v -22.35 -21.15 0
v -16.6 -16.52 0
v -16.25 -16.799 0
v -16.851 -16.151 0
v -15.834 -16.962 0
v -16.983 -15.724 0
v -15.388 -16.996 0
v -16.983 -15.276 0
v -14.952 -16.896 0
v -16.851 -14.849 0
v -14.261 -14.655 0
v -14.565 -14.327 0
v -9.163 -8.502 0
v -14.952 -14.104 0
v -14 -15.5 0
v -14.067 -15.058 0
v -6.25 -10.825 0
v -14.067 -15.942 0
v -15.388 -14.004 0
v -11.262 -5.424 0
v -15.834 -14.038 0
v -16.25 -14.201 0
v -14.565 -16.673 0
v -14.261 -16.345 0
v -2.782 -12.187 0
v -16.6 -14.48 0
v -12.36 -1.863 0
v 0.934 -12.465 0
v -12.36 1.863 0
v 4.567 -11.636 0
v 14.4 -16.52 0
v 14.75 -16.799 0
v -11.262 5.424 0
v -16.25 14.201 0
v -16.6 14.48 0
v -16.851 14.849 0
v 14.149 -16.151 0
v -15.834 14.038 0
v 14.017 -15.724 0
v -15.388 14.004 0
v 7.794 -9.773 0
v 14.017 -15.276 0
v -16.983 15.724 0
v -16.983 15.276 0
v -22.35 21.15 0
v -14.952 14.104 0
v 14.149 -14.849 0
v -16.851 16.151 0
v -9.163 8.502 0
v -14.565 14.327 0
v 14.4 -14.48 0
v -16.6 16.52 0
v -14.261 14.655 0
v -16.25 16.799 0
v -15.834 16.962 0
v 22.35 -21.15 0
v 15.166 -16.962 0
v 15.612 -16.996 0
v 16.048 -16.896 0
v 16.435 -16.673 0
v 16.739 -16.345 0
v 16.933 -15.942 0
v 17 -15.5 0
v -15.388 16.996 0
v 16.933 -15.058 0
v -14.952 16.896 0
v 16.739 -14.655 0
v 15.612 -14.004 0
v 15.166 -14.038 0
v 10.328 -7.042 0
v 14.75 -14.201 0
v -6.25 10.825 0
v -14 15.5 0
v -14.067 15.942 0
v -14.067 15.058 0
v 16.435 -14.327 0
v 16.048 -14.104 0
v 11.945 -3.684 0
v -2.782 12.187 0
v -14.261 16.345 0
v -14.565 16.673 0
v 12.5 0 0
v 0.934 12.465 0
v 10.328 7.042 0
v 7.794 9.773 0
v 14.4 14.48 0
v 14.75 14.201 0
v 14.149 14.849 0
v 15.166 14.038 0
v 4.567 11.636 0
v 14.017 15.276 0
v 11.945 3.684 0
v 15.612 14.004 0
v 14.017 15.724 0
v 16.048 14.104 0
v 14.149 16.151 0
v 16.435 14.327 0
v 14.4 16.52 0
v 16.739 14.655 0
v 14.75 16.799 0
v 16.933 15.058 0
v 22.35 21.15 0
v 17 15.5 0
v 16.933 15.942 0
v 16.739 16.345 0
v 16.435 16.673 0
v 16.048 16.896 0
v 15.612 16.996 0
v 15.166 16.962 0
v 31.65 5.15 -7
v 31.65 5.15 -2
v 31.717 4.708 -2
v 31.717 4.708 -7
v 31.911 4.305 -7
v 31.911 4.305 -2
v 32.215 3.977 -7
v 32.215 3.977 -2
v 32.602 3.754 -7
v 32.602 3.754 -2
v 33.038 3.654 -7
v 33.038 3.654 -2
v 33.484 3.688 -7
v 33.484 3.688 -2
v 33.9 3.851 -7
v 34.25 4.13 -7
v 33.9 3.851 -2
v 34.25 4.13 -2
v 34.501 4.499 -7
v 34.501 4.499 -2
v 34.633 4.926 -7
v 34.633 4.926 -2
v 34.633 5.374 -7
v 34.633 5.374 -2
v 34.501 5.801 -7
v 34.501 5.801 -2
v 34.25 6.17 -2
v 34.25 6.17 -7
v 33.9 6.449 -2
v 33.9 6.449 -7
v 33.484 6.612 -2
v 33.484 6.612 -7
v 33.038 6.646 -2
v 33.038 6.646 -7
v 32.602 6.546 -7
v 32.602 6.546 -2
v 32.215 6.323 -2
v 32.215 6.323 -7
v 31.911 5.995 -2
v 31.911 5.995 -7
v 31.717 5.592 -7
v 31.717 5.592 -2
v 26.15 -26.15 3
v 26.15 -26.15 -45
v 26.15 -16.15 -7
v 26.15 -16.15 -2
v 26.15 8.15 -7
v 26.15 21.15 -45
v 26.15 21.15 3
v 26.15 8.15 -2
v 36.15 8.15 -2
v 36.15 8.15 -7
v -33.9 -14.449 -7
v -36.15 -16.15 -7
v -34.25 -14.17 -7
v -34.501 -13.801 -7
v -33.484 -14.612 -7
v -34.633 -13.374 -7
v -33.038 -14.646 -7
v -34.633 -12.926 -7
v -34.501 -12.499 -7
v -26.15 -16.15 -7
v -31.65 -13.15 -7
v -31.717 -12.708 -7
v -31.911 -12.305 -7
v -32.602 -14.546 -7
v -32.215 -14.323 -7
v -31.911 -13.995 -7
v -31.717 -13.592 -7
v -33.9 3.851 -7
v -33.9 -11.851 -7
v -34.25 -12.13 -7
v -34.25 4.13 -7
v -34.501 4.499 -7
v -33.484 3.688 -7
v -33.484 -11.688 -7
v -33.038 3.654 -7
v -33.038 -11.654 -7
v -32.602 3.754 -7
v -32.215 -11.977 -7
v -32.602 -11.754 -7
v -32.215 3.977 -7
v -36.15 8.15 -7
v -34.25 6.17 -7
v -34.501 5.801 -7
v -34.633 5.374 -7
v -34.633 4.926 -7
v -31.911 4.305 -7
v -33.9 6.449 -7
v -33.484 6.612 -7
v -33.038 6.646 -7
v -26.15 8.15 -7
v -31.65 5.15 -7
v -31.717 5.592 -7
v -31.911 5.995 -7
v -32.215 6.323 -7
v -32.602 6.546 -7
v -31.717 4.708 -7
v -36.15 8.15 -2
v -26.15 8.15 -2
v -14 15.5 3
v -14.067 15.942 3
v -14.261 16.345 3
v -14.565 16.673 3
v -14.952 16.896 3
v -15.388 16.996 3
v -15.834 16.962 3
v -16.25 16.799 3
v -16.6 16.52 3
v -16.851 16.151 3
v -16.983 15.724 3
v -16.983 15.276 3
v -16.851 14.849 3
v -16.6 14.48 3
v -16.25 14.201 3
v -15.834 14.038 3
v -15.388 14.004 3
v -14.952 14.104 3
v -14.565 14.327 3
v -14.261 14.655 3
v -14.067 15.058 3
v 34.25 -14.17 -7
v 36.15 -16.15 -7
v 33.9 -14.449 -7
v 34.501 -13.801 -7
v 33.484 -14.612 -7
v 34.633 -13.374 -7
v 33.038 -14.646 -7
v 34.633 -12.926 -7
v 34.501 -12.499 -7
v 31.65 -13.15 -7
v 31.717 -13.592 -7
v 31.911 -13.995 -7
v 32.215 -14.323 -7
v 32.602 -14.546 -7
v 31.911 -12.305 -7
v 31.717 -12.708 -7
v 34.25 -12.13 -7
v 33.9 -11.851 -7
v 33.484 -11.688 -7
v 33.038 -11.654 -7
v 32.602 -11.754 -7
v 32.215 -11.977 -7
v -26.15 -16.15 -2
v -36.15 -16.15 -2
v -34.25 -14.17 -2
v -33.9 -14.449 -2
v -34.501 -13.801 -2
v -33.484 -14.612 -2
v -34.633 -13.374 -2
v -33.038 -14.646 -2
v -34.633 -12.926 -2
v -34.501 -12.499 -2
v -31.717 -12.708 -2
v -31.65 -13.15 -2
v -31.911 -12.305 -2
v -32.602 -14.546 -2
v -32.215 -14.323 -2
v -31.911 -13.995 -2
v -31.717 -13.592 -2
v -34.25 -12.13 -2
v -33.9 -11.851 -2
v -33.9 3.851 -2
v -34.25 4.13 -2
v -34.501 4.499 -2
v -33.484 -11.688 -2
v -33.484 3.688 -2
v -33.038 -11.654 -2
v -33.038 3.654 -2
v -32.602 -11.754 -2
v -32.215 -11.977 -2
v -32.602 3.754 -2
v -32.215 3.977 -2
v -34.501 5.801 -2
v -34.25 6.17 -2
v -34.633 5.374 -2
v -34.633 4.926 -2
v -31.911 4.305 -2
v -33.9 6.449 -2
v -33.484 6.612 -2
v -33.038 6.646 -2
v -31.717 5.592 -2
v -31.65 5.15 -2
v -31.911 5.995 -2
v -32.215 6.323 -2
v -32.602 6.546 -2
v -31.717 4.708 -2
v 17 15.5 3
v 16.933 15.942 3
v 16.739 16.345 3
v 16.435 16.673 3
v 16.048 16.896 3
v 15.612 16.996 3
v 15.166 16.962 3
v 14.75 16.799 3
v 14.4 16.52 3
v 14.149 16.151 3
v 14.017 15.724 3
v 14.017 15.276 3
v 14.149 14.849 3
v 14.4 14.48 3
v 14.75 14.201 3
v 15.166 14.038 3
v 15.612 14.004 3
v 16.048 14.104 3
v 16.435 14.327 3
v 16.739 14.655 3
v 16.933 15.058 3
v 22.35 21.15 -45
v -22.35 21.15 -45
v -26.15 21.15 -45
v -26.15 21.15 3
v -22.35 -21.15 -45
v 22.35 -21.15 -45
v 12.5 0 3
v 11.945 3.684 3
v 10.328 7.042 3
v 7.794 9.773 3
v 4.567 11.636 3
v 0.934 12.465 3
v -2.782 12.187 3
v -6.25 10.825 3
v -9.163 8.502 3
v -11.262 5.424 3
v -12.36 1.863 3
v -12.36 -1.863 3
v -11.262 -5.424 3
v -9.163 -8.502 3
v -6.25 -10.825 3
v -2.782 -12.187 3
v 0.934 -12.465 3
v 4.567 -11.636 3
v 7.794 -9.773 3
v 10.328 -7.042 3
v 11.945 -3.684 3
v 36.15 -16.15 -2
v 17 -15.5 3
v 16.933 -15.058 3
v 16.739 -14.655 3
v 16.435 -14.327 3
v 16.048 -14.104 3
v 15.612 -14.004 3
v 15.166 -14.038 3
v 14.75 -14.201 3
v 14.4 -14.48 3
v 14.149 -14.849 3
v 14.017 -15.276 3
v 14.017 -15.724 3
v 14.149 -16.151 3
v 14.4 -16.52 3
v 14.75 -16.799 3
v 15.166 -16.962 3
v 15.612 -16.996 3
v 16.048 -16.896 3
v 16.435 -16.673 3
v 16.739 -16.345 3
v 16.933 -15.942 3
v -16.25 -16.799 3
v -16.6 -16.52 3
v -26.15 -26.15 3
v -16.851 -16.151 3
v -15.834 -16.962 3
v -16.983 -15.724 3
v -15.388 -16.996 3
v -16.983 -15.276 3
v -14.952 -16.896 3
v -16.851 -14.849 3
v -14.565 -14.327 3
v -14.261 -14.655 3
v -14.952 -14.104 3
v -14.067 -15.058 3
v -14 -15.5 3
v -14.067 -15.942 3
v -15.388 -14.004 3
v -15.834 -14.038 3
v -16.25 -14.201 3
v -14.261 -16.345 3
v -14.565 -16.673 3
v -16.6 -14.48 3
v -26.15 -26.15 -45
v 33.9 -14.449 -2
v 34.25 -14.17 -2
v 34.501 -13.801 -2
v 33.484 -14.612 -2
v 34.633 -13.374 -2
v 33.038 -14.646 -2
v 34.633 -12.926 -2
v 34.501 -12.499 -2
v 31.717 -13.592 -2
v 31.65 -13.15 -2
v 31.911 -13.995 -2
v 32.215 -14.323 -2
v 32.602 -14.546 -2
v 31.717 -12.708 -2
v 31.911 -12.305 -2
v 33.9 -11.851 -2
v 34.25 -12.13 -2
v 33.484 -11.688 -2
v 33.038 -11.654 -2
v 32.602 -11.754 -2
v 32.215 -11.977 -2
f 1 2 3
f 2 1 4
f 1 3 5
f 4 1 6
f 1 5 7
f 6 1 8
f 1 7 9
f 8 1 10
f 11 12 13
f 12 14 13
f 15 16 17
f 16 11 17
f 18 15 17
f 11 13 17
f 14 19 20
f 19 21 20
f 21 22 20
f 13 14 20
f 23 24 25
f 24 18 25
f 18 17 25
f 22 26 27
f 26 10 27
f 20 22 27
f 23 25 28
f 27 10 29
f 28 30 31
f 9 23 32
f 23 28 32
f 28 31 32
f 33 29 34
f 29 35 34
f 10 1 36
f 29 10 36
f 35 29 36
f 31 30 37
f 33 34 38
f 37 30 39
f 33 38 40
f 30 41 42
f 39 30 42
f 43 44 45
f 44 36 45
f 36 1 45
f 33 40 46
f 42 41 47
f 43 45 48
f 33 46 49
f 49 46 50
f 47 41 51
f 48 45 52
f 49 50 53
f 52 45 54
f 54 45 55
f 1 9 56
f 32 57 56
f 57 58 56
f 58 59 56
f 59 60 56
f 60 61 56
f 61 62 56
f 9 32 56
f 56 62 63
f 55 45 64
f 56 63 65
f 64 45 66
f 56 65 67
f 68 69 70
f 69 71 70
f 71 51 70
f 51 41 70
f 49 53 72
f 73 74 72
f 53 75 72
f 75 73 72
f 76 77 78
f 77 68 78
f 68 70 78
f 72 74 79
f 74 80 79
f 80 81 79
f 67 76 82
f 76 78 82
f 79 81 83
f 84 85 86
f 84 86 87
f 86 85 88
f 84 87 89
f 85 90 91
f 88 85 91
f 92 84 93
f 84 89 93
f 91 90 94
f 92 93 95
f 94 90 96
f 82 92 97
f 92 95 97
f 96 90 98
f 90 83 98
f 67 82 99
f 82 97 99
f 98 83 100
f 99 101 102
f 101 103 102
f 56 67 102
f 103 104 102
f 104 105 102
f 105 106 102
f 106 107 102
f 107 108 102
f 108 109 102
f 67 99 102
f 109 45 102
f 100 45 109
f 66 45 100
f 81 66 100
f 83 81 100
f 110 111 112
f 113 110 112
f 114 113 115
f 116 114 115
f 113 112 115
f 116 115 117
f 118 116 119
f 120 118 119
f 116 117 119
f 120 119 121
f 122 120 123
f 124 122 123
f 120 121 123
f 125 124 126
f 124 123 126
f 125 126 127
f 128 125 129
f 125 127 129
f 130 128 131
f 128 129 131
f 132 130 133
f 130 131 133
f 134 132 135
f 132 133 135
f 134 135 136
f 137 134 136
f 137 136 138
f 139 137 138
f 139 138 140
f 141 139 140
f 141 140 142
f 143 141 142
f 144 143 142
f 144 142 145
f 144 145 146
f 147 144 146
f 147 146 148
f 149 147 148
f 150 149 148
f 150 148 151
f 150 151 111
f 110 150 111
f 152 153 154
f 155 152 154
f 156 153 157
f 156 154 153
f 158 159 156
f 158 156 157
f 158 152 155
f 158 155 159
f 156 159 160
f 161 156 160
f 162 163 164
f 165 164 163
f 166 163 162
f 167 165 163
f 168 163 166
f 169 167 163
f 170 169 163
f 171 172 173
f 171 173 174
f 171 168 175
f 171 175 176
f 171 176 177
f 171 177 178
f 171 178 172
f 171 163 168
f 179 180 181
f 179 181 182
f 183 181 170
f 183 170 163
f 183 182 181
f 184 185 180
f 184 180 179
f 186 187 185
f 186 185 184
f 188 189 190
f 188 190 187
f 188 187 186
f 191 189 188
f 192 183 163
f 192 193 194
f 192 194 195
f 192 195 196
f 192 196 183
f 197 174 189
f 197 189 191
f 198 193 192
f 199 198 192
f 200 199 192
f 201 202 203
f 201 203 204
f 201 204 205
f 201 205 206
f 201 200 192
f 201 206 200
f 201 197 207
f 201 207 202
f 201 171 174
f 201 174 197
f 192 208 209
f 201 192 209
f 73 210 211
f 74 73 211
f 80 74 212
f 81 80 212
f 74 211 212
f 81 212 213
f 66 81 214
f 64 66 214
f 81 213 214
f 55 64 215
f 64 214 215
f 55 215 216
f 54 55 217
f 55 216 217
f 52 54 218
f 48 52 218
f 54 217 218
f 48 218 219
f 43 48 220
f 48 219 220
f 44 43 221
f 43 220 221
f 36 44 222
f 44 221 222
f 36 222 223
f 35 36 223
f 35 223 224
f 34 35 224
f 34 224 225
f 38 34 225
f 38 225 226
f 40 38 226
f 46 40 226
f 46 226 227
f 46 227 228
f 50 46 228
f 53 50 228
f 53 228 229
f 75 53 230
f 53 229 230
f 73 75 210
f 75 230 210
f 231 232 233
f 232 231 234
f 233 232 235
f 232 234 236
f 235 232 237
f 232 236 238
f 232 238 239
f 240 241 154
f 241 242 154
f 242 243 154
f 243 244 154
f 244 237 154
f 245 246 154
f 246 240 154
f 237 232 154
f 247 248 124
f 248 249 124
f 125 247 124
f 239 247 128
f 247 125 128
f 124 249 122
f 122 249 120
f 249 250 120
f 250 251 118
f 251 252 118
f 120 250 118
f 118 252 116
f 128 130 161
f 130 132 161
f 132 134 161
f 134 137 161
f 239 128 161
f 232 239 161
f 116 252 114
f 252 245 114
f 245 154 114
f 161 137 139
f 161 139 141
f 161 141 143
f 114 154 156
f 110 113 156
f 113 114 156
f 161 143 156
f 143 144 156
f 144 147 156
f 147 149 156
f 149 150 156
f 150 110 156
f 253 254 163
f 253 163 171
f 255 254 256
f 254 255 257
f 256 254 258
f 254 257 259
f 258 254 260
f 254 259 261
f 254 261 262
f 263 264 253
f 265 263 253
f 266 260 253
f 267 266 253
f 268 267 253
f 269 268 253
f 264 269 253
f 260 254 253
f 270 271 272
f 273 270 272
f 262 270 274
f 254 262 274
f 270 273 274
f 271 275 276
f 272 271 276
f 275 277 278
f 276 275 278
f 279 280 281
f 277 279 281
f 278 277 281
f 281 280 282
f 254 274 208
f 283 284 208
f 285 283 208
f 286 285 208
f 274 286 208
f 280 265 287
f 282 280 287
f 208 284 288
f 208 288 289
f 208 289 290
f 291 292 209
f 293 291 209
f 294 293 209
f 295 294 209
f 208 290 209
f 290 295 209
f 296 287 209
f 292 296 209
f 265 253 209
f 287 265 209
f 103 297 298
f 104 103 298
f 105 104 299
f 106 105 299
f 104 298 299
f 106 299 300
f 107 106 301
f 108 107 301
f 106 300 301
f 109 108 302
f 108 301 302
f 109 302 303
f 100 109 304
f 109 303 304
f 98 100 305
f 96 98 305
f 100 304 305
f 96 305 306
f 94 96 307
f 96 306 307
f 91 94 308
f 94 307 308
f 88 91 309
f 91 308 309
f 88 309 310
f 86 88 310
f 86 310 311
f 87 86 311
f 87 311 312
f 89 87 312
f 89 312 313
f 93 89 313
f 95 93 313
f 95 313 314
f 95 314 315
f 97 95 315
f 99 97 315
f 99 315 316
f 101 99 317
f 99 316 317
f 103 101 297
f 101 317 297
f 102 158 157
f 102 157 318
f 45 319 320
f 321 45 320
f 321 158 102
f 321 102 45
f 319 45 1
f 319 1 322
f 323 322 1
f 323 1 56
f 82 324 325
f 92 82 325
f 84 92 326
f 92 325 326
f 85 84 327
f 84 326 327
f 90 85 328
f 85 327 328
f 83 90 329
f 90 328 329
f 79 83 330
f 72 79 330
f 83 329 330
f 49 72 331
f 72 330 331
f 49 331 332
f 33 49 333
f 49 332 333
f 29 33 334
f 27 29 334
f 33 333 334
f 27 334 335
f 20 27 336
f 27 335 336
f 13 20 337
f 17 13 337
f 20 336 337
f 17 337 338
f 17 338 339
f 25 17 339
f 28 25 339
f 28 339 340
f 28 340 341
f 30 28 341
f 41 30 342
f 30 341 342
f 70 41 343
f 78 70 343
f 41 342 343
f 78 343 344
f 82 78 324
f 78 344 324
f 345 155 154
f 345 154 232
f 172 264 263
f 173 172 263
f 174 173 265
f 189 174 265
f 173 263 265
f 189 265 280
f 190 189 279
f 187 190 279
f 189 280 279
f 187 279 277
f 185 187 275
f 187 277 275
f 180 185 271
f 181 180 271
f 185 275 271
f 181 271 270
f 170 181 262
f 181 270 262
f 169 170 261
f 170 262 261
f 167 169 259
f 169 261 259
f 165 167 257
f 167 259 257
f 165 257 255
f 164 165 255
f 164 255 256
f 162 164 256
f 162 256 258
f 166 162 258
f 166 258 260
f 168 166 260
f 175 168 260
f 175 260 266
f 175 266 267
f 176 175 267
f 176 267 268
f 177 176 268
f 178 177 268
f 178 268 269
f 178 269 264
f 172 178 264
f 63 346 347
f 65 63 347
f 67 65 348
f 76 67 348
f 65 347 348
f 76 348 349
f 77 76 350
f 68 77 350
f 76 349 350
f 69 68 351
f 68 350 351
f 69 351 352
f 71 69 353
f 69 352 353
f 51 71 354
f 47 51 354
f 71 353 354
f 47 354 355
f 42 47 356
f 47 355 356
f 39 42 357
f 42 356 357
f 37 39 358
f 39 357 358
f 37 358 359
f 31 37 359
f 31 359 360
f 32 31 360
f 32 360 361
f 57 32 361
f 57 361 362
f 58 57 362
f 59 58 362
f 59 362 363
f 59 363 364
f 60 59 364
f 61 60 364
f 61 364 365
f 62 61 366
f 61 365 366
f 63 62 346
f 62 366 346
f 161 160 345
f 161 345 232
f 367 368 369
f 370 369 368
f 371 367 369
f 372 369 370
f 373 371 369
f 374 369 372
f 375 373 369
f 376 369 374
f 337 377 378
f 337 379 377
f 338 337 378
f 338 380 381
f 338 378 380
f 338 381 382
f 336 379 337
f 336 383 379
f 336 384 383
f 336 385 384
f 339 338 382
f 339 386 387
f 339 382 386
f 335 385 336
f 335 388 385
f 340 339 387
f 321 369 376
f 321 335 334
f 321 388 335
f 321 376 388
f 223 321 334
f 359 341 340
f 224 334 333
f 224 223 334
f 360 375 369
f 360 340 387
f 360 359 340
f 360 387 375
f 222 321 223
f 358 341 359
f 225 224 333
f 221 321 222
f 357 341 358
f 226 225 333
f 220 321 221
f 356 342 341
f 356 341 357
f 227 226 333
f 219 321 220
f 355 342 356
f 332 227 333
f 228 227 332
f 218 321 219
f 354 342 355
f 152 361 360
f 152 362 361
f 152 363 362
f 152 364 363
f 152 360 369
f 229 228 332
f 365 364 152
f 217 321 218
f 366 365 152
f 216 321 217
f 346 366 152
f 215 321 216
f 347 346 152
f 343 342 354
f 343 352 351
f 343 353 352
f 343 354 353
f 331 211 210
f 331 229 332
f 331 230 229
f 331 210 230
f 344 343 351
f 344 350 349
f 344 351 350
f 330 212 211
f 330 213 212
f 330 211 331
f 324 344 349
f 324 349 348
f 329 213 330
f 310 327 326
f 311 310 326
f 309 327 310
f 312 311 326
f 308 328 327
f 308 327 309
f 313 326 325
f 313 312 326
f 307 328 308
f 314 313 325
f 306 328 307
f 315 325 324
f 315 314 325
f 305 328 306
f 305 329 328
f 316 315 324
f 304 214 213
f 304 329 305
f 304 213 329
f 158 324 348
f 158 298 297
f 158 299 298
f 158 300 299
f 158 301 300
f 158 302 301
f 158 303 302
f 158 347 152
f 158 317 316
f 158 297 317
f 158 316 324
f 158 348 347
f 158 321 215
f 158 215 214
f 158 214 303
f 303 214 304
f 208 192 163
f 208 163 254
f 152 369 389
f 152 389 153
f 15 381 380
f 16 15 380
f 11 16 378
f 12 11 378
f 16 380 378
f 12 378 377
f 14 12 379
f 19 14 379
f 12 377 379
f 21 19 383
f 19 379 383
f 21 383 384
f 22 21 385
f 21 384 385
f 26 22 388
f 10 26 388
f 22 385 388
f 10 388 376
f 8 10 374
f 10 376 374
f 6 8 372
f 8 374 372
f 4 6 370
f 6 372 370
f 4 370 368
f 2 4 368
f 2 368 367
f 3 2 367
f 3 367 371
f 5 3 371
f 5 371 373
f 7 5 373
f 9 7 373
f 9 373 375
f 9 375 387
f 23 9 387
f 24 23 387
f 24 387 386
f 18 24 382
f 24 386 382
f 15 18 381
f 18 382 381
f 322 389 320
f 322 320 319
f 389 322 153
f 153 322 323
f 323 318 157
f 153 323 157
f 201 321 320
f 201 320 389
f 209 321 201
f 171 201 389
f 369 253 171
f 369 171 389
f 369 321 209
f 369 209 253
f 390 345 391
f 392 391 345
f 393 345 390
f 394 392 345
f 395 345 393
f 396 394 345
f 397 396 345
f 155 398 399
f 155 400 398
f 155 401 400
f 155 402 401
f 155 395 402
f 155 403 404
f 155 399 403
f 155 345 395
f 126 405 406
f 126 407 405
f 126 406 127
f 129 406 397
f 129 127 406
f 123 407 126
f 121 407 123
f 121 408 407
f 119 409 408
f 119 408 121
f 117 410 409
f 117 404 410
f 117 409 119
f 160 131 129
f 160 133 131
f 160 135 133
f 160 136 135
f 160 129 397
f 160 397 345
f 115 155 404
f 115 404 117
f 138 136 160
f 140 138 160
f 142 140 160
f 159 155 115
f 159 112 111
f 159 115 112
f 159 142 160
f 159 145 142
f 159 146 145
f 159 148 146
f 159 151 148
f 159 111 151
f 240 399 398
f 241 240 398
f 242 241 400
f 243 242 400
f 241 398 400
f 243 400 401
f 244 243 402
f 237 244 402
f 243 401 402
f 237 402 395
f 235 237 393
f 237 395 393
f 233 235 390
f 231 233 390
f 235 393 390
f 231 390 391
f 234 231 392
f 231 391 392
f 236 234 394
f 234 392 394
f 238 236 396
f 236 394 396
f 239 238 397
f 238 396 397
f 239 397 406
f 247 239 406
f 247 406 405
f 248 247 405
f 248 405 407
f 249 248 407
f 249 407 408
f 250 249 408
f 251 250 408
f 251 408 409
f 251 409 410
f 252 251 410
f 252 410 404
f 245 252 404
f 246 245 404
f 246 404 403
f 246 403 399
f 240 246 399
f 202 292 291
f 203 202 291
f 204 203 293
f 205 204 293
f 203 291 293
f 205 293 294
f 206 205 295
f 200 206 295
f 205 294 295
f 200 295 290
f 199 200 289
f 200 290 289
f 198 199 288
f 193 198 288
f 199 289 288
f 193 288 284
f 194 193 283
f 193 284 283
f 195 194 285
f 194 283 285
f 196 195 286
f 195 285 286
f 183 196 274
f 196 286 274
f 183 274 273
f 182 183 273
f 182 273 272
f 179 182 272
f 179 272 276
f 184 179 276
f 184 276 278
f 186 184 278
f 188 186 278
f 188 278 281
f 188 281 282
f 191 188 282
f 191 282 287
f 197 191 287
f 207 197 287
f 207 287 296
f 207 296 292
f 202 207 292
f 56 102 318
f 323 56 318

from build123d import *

# Parameters (mm, degrees)
SKETCH_1_W          = 42.3
SKETCH_1_H          = 42.3
EXTRUDE_1_DEPTH     = 3
SKETCH_2_R          = 1.5
CUT_EXTRUDE_1_DEPTH = 3
SKETCH_3_R          = 12.5
CUT_EXTRUDE_2_DEPTH = 3
EXTRUDE_2_DEPTH     = 48
SKETCH_5_W          = 5
SKETCH_5_H          = 47.3
EXTRUDE_3_DEPTH     = 10
SKETCH_6_W          = 5
SKETCH_6_H          = 47.3
EXTRUDE_4_DEPTH     = 10
SKETCH_7_R          = 1.5
CUT_EXTRUDE_3_DEPTH = 10
SKETCH_8_W          = 44.7
SKETCH_8_H          = 45
CUT_EXTRUDE_4_DEPTH = 42.3
SKETCH_10_W         = 10
SKETCH_10_H         = 13
SKETCH_10_H_2       = 10
CUT_EXTRUDE_5_DEPTH = 10


with BuildPart() as part:
    # 草图1 → 凸台-拉伸1 (new body)
    with BuildSketch(Plane.XY):
        Rectangle(SKETCH_1_W, SKETCH_1_H)
    extrude(amount=EXTRUDE_1_DEPTH)

    # 草图2 → 切除-拉伸1 (cut)
    with BuildSketch(Plane.XY.offset(3)):
        with Locations((-15.5, 15.5)):
            Circle(SKETCH_2_R)
        with Locations((15.5, 15.5)):
            Circle(SKETCH_2_R)
        with Locations((15.5, -15.5)):
            Circle(SKETCH_2_R)
        with Locations((-15.5, -15.5)):
            Circle(SKETCH_2_R)
    extrude(amount=-CUT_EXTRUDE_1_DEPTH, mode=Mode.SUBTRACT)

    # 草图3 → 切除-拉伸2 (cut)
    with BuildSketch(Plane.XY.offset(3)):
        Circle(SKETCH_3_R)
    extrude(amount=-CUT_EXTRUDE_2_DEPTH, mode=Mode.SUBTRACT)

    # 草图4 → 凸台-拉伸2 (add)
    with BuildSketch(Plane.XY.offset(3)):
        Polygon((-26.15, -26.15), (26.15, -26.15), (26.15, 21.15), (21.15, 21.15), (21.15, -21.15), (-21.15, -21.15), (-21.15, 21.15), (-26.15, 21.15), align=None)
    extrude(amount=-EXTRUDE_2_DEPTH)

    # 草图5 → 凸台-拉伸3 (add)
    with BuildSketch(Plane.ZY.offset(26.15)):
        with Locations((-4.5, -2.5)):
            Rectangle(SKETCH_5_W, SKETCH_5_H)
    extrude(amount=EXTRUDE_3_DEPTH)

    # 草图6 → 凸台-拉伸4 (add)
    with BuildSketch(Plane(origin=(26.15, 0, 0), x_dir=(0, 0, -1), z_dir=(1, 0, 0))):
        with Locations((4.5, -2.5)):
            Rectangle(SKETCH_6_W, SKETCH_6_H)
    extrude(amount=EXTRUDE_4_DEPTH)

    # 草图7 → 切除-拉伸3 (cut)
    with BuildSketch(Plane.XY.offset(3)):
        with Locations((-33.15, -13.15)):
            Circle(SKETCH_7_R)
        with Locations((-33.15, 5.15)):
            Circle(SKETCH_7_R)
        with Locations(Location((33.15, -13.15, 0), (0, 0, 180))):
            Circle(SKETCH_7_R)
        with Locations(Location((33.15, 5.15, 0), (0, 0, 180))):
            Circle(SKETCH_7_R)
    extrude(amount=-CUT_EXTRUDE_3_DEPTH, mode=Mode.SUBTRACT)

    # 草图8 → 切除-拉伸4 (cut)
    with BuildSketch(Plane(origin=(0, 21.15, 0), x_dir=(1, 0, 0), z_dir=(0, 1, 0))):
        with Locations((0, 22.5)):
            Rectangle(SKETCH_8_W, SKETCH_8_H)
    extrude(amount=-CUT_EXTRUDE_4_DEPTH, mode=Mode.SUBTRACT)

    # 草图10 → 切除-拉伸5 (cut)
    with BuildSketch(Plane.XY.offset(-2)):
        with Locations((-31.15, 14.65)):
            Rectangle(SKETCH_10_W, SKETCH_10_H)
        with Locations((31.15, 14.65)):
            Rectangle(SKETCH_10_W, SKETCH_10_H)
        with Locations((-31.15, -21.15)):
            Rectangle(SKETCH_10_W, SKETCH_10_H_2)
        with Locations((31.15, -21.15)):
            Rectangle(SKETCH_10_W, SKETCH_10_H_2)
    extrude(amount=-CUT_EXTRUDE_5_DEPTH, mode=Mode.SUBTRACT)


solid = part.part
